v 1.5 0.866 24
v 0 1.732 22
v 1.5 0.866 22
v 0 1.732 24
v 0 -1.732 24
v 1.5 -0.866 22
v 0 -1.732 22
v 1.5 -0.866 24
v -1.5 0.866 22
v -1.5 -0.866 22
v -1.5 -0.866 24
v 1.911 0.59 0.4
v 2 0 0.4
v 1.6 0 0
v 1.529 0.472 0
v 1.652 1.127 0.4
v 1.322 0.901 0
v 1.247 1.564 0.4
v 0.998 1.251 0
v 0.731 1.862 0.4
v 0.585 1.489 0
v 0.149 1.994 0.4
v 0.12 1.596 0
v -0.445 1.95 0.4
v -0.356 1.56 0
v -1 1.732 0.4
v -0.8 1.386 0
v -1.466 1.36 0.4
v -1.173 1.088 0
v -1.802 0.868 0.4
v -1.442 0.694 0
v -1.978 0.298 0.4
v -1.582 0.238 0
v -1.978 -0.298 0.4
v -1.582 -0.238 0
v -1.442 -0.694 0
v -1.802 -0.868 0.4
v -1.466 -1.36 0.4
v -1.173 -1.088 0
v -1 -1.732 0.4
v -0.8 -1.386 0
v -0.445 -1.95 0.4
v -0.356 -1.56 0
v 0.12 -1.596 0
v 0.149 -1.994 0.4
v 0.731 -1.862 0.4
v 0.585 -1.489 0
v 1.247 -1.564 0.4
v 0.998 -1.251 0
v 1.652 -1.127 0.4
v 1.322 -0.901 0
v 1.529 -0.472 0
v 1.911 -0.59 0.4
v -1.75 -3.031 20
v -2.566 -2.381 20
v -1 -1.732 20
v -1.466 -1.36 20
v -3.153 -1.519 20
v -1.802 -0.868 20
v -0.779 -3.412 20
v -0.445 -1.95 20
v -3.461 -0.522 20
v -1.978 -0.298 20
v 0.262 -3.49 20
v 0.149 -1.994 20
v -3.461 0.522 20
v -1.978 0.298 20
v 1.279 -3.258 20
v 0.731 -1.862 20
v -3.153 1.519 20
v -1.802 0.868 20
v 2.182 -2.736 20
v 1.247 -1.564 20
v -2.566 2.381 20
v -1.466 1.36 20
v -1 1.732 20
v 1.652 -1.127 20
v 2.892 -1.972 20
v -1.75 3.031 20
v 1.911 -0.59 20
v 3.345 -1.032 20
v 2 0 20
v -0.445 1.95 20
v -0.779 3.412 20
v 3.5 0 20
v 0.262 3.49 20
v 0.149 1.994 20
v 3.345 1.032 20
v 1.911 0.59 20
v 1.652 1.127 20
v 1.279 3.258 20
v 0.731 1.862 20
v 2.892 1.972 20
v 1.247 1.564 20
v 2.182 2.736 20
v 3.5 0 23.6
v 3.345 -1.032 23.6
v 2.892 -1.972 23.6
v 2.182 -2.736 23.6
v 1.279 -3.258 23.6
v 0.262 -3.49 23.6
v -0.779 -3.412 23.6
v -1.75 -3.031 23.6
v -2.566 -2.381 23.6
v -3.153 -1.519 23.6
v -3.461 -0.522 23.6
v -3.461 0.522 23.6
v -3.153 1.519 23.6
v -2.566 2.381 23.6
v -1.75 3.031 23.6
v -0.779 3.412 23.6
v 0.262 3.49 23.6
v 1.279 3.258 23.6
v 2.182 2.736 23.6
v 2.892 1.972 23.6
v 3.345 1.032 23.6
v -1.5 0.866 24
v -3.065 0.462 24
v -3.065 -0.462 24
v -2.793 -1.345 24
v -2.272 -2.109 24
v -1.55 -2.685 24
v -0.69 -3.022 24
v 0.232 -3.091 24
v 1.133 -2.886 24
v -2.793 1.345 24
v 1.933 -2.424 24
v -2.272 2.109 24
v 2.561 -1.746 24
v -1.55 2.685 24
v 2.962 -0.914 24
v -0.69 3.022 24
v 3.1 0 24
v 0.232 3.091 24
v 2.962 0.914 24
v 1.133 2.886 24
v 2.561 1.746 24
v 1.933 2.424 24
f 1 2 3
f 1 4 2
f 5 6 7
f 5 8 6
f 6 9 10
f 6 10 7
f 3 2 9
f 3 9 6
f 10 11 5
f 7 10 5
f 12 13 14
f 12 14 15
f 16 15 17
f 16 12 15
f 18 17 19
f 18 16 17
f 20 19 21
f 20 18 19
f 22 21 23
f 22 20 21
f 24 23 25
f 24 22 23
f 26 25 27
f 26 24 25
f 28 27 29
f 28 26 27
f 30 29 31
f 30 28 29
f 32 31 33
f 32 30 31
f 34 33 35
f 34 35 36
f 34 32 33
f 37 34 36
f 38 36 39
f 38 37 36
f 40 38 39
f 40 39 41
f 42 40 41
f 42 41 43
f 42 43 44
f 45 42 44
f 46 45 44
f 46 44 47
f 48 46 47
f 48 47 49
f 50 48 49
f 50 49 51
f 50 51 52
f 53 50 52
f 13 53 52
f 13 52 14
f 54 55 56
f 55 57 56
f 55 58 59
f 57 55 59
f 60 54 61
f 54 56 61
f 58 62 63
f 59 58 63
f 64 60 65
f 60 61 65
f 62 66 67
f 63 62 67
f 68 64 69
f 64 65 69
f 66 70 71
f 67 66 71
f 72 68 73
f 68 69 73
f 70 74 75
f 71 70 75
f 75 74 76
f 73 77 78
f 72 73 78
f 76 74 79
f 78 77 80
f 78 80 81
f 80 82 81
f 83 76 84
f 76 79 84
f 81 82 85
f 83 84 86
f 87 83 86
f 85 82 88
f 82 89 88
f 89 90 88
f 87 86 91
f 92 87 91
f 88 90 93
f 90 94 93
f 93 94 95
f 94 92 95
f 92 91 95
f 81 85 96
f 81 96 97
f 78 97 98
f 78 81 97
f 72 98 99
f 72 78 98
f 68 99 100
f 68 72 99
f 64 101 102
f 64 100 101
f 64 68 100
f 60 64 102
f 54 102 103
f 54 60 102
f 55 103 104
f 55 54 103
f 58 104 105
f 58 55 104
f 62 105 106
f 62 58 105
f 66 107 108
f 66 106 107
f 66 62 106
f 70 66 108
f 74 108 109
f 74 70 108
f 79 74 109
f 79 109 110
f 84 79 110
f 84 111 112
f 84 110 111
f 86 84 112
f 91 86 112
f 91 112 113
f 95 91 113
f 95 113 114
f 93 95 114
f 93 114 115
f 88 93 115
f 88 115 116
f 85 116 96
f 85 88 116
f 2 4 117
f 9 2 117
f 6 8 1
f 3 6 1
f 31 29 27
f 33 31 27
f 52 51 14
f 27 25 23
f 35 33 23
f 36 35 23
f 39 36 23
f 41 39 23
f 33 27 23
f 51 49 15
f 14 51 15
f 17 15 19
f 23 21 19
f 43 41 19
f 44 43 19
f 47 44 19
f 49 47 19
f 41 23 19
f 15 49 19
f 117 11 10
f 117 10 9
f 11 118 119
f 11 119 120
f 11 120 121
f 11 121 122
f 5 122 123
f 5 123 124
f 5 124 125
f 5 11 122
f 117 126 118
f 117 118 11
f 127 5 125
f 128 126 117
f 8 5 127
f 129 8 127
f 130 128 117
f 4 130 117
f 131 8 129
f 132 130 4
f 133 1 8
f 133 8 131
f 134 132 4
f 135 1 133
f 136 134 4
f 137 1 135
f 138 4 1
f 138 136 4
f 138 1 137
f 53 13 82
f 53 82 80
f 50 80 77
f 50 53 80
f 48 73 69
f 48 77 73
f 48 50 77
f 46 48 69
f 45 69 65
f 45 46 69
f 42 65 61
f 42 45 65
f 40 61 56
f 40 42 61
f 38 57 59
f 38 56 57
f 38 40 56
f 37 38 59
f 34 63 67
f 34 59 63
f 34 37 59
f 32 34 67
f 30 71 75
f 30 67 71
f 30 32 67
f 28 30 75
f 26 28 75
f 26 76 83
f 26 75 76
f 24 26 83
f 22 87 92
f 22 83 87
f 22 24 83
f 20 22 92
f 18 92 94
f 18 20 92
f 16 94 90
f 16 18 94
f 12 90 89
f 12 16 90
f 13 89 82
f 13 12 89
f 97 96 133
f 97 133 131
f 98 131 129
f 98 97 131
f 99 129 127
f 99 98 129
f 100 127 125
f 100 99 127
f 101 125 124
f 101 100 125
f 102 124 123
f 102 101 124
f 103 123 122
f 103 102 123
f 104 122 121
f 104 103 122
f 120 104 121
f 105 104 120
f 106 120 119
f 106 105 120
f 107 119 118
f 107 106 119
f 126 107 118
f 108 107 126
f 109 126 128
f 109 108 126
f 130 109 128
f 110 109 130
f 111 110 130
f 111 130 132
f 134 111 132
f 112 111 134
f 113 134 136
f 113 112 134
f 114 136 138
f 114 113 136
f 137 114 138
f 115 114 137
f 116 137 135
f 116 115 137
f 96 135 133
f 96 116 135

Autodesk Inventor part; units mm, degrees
ref_plane "YZ Plane" through (0, 0, 0) normal (1, 0, 0) x (0, 1, 0)
ref_plane "XZ Plane" through (0, 0, 0) normal (0, 1, 0) x (-1, 0, 0)
ref_plane "XY Plane" through (0, 0, 0) normal (0, 0, 1) x (1, 0, 0)
sketch "Sketch1" plane through (0, 0, 0) normal (0, 0, 1) x (1, 0, 0)
  circle A0 centre (0, 0) radius 2
  dimension "Diameter" = 4
extrude "Extrusion1" add sketch "Sketch1" along normal blind 20
sketch "Sketch2" plane through (0, 0, 20) normal (0, 0, 1) x (1, 0, 0)
  circle A0 centre (0, 0) radius 2 projected
  circle A1 centre (0, 0) radius 3.5
  dimension "Head_Diameter" = 7
extrude "Extrusion2" add sketch "Sketch2" along normal blind 4 contours A0 | A1
sketch "Sketch3" plane through (0, 0, 24) normal (0, 0, 1) x (1, 0, 0)
  circle A0 centre (0, 0) radius 3.5 projected
  circle A1 centre (0, 0) radius 1.7321 construction
  line L0 (0, 1.7321) -> (1.5, 0.866)
  line L1 (1.5, -0.866) -> (1.5, 0.866)
  line L2 (0, 1.7321) -> (-1.5, 0.866)
  line L3 (-1.5, -0.866) -> (-1.5, 0.866)
  line L4 (-1.5, -0.866) -> (0, -1.7321)
  line L5 (1.5, -0.866) -> (0, -1.7321)
  dimension "Hex_Width" = 3
extrude "Extrusion3" cut sketch "Sketch3" against normal blind 2 contours L0 L1 L5 L4 L3 L2
thread "Thread1" size "M4x0.7" class "4g6g" standard "ANSI Metric M Profile" length 20
chamfer "Chamfer1" distance 0.4 angle 45 2 edges at (-3.5, 0, 24) (-2, 0, 0)
equation "\"d9\" = ThreadLength"
equation "\"d12\" = Chamfer"
equation "\"ThreadLength\" = 20"
equation "\"Chamfer\" = 0.4"
properties part number "SCREW, SOCKET HD, P, 12_9, M4X0_7X20" material "Steel, MS"
